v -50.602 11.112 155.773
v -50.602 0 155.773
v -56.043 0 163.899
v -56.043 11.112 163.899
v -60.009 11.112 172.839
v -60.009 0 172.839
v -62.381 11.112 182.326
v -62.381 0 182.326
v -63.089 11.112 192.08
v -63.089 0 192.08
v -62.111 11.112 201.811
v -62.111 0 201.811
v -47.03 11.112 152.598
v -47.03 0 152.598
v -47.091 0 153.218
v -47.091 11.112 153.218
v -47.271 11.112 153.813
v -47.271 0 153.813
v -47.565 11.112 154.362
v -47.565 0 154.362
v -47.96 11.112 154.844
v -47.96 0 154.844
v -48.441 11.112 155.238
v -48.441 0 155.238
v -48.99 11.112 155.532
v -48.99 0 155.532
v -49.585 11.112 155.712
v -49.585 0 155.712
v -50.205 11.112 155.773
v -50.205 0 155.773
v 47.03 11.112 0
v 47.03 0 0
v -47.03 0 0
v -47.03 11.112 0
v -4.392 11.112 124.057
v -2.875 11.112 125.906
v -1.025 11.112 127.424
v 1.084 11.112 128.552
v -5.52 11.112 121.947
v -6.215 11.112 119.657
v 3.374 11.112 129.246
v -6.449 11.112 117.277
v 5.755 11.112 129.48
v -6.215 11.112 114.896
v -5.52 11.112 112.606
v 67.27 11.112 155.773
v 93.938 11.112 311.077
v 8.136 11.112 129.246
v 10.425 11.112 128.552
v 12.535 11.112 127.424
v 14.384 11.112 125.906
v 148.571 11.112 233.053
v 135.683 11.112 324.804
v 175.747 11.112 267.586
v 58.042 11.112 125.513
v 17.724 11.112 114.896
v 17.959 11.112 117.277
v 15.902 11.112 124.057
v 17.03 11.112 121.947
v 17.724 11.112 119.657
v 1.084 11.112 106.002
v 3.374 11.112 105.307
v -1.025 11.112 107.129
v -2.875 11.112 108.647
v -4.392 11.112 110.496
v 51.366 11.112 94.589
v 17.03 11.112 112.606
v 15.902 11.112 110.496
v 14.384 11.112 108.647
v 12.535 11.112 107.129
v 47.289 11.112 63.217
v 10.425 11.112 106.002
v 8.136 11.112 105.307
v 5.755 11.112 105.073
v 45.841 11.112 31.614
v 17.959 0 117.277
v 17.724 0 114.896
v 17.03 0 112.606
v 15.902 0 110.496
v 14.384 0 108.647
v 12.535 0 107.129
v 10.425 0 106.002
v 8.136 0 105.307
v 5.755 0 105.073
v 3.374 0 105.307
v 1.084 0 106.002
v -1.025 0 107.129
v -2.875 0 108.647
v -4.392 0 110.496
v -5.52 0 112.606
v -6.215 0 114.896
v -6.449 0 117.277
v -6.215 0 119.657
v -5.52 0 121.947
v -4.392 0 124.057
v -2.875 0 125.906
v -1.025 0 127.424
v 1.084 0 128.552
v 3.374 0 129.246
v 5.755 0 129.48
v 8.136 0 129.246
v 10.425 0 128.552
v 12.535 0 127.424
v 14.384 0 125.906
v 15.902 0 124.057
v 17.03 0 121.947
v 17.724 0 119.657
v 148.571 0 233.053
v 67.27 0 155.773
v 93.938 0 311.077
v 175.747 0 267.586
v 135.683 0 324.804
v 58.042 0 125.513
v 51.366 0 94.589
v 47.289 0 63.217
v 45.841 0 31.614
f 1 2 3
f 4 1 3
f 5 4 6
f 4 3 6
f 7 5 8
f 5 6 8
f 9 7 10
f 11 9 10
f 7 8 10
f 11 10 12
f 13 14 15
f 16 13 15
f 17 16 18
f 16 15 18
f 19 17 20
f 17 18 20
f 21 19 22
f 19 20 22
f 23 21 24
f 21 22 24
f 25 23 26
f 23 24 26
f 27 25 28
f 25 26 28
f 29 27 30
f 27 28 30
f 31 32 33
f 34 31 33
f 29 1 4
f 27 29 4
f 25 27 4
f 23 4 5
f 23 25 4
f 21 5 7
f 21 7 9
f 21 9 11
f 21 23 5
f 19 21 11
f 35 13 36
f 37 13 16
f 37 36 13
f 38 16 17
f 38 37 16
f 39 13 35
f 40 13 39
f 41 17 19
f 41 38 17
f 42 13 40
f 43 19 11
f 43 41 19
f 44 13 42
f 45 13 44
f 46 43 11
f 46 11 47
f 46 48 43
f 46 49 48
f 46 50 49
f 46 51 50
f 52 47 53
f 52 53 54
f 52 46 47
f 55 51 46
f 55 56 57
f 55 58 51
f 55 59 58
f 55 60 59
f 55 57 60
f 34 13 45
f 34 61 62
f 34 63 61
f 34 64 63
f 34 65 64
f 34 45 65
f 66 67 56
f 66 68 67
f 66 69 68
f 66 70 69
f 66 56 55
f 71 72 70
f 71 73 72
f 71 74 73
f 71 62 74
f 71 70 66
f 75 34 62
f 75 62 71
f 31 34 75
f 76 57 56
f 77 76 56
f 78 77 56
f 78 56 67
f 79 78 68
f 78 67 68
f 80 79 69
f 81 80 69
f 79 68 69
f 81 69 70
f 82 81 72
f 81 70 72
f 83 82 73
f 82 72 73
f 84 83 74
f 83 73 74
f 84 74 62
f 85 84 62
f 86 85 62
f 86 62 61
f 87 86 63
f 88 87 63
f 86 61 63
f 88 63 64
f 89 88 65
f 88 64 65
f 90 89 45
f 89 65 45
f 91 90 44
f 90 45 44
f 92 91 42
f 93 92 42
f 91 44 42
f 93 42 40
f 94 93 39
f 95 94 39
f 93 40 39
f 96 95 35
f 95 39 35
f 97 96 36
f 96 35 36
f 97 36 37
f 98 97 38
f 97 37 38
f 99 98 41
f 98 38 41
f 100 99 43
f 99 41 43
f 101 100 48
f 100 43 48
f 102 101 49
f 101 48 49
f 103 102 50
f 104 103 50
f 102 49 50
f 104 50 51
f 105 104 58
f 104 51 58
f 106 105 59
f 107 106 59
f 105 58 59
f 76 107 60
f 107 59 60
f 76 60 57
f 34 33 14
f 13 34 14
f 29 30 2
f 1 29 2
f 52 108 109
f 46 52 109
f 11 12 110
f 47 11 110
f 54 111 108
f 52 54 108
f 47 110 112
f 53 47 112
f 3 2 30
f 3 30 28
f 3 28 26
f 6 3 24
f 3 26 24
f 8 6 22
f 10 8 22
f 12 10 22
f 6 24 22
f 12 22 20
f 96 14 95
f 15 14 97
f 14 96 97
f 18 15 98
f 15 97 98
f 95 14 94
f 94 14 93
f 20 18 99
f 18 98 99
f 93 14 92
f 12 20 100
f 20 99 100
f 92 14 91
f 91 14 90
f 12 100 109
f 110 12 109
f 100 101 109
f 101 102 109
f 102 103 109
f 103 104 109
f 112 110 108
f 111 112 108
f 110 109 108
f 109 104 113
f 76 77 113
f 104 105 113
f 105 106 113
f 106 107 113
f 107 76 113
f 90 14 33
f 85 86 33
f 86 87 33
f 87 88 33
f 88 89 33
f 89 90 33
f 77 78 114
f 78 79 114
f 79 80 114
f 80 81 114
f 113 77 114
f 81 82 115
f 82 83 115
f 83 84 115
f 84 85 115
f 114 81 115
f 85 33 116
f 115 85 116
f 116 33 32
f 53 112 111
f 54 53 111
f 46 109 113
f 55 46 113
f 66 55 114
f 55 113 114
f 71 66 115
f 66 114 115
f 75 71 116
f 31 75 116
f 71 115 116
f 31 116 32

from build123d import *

# Parameters (mm, degrees)
SKETCH1_R           = 7.9375
BOSS_EXTRUDE1_DEPTH = 11.1125
SKETCH2_R           = 12.20390625
CUT_EXTRUDE1_DEPTH  = 11.1125


with BuildPart() as part:
    # Sketch1 → Boss-Extrude1 (new body)
    with BuildSketch(Plane(origin=(0, 0, 0), x_dir=(1, 0, 0), z_dir=(0, 1, 0))):
        with BuildLine():
            Line((47.0296875, 0), (-47.0296875, 0))
            Line((-47.0296875, 0), (-47.0296875, -152.5984375))
            ThreePointArc((-47.0296875, -152.5984375), (-47.95962347, -154.84350153), (-50.2046875, -155.7734375))
            Line((-50.2046875, -155.7734375), (-50.6015625, -155.7734375))
            ThreePointArc((-50.6015625, -155.7734375), (-61.399867308, -177.531283173), (-62.1109375, -201.8109375))
            Line((-62.1109375, -201.8109375), (93.937526937, -311.077248625))
            Line((93.937526937, -311.077248625), (135.682650242, -324.803661369))
            Line((135.682650242, -324.803661369), (175.746964321, -267.585891076))
            Line((175.746964321, -267.585891076), (148.570682499, -233.053016406))
            Line((148.570682499, -233.053016406), (67.2703125, -155.7734375))
            ThreePointArc((67.2703125, -155.7734375), (49.00058662, -78.945623418), (47.0296875, 0))
        make_face()
        with Locations((5.7546875, -117.2765625)):
            Circle(SKETCH1_R, mode=Mode.SUBTRACT)
    extrude(amount=BOSS_EXTRUDE1_DEPTH)

    # Sketch2 → Cut-Extrude1 (cut)
    with BuildSketch(Plane(origin=(0, 11.1125, 0), x_dir=(1, 0, 0), z_dir=(0, 1, 0))):
        with Locations((5.7546875, -117.2765625)):
            Circle(SKETCH2_R)
    extrude(amount=-CUT_EXTRUDE1_DEPTH, mode=Mode.SUBTRACT)


solid = part.part
